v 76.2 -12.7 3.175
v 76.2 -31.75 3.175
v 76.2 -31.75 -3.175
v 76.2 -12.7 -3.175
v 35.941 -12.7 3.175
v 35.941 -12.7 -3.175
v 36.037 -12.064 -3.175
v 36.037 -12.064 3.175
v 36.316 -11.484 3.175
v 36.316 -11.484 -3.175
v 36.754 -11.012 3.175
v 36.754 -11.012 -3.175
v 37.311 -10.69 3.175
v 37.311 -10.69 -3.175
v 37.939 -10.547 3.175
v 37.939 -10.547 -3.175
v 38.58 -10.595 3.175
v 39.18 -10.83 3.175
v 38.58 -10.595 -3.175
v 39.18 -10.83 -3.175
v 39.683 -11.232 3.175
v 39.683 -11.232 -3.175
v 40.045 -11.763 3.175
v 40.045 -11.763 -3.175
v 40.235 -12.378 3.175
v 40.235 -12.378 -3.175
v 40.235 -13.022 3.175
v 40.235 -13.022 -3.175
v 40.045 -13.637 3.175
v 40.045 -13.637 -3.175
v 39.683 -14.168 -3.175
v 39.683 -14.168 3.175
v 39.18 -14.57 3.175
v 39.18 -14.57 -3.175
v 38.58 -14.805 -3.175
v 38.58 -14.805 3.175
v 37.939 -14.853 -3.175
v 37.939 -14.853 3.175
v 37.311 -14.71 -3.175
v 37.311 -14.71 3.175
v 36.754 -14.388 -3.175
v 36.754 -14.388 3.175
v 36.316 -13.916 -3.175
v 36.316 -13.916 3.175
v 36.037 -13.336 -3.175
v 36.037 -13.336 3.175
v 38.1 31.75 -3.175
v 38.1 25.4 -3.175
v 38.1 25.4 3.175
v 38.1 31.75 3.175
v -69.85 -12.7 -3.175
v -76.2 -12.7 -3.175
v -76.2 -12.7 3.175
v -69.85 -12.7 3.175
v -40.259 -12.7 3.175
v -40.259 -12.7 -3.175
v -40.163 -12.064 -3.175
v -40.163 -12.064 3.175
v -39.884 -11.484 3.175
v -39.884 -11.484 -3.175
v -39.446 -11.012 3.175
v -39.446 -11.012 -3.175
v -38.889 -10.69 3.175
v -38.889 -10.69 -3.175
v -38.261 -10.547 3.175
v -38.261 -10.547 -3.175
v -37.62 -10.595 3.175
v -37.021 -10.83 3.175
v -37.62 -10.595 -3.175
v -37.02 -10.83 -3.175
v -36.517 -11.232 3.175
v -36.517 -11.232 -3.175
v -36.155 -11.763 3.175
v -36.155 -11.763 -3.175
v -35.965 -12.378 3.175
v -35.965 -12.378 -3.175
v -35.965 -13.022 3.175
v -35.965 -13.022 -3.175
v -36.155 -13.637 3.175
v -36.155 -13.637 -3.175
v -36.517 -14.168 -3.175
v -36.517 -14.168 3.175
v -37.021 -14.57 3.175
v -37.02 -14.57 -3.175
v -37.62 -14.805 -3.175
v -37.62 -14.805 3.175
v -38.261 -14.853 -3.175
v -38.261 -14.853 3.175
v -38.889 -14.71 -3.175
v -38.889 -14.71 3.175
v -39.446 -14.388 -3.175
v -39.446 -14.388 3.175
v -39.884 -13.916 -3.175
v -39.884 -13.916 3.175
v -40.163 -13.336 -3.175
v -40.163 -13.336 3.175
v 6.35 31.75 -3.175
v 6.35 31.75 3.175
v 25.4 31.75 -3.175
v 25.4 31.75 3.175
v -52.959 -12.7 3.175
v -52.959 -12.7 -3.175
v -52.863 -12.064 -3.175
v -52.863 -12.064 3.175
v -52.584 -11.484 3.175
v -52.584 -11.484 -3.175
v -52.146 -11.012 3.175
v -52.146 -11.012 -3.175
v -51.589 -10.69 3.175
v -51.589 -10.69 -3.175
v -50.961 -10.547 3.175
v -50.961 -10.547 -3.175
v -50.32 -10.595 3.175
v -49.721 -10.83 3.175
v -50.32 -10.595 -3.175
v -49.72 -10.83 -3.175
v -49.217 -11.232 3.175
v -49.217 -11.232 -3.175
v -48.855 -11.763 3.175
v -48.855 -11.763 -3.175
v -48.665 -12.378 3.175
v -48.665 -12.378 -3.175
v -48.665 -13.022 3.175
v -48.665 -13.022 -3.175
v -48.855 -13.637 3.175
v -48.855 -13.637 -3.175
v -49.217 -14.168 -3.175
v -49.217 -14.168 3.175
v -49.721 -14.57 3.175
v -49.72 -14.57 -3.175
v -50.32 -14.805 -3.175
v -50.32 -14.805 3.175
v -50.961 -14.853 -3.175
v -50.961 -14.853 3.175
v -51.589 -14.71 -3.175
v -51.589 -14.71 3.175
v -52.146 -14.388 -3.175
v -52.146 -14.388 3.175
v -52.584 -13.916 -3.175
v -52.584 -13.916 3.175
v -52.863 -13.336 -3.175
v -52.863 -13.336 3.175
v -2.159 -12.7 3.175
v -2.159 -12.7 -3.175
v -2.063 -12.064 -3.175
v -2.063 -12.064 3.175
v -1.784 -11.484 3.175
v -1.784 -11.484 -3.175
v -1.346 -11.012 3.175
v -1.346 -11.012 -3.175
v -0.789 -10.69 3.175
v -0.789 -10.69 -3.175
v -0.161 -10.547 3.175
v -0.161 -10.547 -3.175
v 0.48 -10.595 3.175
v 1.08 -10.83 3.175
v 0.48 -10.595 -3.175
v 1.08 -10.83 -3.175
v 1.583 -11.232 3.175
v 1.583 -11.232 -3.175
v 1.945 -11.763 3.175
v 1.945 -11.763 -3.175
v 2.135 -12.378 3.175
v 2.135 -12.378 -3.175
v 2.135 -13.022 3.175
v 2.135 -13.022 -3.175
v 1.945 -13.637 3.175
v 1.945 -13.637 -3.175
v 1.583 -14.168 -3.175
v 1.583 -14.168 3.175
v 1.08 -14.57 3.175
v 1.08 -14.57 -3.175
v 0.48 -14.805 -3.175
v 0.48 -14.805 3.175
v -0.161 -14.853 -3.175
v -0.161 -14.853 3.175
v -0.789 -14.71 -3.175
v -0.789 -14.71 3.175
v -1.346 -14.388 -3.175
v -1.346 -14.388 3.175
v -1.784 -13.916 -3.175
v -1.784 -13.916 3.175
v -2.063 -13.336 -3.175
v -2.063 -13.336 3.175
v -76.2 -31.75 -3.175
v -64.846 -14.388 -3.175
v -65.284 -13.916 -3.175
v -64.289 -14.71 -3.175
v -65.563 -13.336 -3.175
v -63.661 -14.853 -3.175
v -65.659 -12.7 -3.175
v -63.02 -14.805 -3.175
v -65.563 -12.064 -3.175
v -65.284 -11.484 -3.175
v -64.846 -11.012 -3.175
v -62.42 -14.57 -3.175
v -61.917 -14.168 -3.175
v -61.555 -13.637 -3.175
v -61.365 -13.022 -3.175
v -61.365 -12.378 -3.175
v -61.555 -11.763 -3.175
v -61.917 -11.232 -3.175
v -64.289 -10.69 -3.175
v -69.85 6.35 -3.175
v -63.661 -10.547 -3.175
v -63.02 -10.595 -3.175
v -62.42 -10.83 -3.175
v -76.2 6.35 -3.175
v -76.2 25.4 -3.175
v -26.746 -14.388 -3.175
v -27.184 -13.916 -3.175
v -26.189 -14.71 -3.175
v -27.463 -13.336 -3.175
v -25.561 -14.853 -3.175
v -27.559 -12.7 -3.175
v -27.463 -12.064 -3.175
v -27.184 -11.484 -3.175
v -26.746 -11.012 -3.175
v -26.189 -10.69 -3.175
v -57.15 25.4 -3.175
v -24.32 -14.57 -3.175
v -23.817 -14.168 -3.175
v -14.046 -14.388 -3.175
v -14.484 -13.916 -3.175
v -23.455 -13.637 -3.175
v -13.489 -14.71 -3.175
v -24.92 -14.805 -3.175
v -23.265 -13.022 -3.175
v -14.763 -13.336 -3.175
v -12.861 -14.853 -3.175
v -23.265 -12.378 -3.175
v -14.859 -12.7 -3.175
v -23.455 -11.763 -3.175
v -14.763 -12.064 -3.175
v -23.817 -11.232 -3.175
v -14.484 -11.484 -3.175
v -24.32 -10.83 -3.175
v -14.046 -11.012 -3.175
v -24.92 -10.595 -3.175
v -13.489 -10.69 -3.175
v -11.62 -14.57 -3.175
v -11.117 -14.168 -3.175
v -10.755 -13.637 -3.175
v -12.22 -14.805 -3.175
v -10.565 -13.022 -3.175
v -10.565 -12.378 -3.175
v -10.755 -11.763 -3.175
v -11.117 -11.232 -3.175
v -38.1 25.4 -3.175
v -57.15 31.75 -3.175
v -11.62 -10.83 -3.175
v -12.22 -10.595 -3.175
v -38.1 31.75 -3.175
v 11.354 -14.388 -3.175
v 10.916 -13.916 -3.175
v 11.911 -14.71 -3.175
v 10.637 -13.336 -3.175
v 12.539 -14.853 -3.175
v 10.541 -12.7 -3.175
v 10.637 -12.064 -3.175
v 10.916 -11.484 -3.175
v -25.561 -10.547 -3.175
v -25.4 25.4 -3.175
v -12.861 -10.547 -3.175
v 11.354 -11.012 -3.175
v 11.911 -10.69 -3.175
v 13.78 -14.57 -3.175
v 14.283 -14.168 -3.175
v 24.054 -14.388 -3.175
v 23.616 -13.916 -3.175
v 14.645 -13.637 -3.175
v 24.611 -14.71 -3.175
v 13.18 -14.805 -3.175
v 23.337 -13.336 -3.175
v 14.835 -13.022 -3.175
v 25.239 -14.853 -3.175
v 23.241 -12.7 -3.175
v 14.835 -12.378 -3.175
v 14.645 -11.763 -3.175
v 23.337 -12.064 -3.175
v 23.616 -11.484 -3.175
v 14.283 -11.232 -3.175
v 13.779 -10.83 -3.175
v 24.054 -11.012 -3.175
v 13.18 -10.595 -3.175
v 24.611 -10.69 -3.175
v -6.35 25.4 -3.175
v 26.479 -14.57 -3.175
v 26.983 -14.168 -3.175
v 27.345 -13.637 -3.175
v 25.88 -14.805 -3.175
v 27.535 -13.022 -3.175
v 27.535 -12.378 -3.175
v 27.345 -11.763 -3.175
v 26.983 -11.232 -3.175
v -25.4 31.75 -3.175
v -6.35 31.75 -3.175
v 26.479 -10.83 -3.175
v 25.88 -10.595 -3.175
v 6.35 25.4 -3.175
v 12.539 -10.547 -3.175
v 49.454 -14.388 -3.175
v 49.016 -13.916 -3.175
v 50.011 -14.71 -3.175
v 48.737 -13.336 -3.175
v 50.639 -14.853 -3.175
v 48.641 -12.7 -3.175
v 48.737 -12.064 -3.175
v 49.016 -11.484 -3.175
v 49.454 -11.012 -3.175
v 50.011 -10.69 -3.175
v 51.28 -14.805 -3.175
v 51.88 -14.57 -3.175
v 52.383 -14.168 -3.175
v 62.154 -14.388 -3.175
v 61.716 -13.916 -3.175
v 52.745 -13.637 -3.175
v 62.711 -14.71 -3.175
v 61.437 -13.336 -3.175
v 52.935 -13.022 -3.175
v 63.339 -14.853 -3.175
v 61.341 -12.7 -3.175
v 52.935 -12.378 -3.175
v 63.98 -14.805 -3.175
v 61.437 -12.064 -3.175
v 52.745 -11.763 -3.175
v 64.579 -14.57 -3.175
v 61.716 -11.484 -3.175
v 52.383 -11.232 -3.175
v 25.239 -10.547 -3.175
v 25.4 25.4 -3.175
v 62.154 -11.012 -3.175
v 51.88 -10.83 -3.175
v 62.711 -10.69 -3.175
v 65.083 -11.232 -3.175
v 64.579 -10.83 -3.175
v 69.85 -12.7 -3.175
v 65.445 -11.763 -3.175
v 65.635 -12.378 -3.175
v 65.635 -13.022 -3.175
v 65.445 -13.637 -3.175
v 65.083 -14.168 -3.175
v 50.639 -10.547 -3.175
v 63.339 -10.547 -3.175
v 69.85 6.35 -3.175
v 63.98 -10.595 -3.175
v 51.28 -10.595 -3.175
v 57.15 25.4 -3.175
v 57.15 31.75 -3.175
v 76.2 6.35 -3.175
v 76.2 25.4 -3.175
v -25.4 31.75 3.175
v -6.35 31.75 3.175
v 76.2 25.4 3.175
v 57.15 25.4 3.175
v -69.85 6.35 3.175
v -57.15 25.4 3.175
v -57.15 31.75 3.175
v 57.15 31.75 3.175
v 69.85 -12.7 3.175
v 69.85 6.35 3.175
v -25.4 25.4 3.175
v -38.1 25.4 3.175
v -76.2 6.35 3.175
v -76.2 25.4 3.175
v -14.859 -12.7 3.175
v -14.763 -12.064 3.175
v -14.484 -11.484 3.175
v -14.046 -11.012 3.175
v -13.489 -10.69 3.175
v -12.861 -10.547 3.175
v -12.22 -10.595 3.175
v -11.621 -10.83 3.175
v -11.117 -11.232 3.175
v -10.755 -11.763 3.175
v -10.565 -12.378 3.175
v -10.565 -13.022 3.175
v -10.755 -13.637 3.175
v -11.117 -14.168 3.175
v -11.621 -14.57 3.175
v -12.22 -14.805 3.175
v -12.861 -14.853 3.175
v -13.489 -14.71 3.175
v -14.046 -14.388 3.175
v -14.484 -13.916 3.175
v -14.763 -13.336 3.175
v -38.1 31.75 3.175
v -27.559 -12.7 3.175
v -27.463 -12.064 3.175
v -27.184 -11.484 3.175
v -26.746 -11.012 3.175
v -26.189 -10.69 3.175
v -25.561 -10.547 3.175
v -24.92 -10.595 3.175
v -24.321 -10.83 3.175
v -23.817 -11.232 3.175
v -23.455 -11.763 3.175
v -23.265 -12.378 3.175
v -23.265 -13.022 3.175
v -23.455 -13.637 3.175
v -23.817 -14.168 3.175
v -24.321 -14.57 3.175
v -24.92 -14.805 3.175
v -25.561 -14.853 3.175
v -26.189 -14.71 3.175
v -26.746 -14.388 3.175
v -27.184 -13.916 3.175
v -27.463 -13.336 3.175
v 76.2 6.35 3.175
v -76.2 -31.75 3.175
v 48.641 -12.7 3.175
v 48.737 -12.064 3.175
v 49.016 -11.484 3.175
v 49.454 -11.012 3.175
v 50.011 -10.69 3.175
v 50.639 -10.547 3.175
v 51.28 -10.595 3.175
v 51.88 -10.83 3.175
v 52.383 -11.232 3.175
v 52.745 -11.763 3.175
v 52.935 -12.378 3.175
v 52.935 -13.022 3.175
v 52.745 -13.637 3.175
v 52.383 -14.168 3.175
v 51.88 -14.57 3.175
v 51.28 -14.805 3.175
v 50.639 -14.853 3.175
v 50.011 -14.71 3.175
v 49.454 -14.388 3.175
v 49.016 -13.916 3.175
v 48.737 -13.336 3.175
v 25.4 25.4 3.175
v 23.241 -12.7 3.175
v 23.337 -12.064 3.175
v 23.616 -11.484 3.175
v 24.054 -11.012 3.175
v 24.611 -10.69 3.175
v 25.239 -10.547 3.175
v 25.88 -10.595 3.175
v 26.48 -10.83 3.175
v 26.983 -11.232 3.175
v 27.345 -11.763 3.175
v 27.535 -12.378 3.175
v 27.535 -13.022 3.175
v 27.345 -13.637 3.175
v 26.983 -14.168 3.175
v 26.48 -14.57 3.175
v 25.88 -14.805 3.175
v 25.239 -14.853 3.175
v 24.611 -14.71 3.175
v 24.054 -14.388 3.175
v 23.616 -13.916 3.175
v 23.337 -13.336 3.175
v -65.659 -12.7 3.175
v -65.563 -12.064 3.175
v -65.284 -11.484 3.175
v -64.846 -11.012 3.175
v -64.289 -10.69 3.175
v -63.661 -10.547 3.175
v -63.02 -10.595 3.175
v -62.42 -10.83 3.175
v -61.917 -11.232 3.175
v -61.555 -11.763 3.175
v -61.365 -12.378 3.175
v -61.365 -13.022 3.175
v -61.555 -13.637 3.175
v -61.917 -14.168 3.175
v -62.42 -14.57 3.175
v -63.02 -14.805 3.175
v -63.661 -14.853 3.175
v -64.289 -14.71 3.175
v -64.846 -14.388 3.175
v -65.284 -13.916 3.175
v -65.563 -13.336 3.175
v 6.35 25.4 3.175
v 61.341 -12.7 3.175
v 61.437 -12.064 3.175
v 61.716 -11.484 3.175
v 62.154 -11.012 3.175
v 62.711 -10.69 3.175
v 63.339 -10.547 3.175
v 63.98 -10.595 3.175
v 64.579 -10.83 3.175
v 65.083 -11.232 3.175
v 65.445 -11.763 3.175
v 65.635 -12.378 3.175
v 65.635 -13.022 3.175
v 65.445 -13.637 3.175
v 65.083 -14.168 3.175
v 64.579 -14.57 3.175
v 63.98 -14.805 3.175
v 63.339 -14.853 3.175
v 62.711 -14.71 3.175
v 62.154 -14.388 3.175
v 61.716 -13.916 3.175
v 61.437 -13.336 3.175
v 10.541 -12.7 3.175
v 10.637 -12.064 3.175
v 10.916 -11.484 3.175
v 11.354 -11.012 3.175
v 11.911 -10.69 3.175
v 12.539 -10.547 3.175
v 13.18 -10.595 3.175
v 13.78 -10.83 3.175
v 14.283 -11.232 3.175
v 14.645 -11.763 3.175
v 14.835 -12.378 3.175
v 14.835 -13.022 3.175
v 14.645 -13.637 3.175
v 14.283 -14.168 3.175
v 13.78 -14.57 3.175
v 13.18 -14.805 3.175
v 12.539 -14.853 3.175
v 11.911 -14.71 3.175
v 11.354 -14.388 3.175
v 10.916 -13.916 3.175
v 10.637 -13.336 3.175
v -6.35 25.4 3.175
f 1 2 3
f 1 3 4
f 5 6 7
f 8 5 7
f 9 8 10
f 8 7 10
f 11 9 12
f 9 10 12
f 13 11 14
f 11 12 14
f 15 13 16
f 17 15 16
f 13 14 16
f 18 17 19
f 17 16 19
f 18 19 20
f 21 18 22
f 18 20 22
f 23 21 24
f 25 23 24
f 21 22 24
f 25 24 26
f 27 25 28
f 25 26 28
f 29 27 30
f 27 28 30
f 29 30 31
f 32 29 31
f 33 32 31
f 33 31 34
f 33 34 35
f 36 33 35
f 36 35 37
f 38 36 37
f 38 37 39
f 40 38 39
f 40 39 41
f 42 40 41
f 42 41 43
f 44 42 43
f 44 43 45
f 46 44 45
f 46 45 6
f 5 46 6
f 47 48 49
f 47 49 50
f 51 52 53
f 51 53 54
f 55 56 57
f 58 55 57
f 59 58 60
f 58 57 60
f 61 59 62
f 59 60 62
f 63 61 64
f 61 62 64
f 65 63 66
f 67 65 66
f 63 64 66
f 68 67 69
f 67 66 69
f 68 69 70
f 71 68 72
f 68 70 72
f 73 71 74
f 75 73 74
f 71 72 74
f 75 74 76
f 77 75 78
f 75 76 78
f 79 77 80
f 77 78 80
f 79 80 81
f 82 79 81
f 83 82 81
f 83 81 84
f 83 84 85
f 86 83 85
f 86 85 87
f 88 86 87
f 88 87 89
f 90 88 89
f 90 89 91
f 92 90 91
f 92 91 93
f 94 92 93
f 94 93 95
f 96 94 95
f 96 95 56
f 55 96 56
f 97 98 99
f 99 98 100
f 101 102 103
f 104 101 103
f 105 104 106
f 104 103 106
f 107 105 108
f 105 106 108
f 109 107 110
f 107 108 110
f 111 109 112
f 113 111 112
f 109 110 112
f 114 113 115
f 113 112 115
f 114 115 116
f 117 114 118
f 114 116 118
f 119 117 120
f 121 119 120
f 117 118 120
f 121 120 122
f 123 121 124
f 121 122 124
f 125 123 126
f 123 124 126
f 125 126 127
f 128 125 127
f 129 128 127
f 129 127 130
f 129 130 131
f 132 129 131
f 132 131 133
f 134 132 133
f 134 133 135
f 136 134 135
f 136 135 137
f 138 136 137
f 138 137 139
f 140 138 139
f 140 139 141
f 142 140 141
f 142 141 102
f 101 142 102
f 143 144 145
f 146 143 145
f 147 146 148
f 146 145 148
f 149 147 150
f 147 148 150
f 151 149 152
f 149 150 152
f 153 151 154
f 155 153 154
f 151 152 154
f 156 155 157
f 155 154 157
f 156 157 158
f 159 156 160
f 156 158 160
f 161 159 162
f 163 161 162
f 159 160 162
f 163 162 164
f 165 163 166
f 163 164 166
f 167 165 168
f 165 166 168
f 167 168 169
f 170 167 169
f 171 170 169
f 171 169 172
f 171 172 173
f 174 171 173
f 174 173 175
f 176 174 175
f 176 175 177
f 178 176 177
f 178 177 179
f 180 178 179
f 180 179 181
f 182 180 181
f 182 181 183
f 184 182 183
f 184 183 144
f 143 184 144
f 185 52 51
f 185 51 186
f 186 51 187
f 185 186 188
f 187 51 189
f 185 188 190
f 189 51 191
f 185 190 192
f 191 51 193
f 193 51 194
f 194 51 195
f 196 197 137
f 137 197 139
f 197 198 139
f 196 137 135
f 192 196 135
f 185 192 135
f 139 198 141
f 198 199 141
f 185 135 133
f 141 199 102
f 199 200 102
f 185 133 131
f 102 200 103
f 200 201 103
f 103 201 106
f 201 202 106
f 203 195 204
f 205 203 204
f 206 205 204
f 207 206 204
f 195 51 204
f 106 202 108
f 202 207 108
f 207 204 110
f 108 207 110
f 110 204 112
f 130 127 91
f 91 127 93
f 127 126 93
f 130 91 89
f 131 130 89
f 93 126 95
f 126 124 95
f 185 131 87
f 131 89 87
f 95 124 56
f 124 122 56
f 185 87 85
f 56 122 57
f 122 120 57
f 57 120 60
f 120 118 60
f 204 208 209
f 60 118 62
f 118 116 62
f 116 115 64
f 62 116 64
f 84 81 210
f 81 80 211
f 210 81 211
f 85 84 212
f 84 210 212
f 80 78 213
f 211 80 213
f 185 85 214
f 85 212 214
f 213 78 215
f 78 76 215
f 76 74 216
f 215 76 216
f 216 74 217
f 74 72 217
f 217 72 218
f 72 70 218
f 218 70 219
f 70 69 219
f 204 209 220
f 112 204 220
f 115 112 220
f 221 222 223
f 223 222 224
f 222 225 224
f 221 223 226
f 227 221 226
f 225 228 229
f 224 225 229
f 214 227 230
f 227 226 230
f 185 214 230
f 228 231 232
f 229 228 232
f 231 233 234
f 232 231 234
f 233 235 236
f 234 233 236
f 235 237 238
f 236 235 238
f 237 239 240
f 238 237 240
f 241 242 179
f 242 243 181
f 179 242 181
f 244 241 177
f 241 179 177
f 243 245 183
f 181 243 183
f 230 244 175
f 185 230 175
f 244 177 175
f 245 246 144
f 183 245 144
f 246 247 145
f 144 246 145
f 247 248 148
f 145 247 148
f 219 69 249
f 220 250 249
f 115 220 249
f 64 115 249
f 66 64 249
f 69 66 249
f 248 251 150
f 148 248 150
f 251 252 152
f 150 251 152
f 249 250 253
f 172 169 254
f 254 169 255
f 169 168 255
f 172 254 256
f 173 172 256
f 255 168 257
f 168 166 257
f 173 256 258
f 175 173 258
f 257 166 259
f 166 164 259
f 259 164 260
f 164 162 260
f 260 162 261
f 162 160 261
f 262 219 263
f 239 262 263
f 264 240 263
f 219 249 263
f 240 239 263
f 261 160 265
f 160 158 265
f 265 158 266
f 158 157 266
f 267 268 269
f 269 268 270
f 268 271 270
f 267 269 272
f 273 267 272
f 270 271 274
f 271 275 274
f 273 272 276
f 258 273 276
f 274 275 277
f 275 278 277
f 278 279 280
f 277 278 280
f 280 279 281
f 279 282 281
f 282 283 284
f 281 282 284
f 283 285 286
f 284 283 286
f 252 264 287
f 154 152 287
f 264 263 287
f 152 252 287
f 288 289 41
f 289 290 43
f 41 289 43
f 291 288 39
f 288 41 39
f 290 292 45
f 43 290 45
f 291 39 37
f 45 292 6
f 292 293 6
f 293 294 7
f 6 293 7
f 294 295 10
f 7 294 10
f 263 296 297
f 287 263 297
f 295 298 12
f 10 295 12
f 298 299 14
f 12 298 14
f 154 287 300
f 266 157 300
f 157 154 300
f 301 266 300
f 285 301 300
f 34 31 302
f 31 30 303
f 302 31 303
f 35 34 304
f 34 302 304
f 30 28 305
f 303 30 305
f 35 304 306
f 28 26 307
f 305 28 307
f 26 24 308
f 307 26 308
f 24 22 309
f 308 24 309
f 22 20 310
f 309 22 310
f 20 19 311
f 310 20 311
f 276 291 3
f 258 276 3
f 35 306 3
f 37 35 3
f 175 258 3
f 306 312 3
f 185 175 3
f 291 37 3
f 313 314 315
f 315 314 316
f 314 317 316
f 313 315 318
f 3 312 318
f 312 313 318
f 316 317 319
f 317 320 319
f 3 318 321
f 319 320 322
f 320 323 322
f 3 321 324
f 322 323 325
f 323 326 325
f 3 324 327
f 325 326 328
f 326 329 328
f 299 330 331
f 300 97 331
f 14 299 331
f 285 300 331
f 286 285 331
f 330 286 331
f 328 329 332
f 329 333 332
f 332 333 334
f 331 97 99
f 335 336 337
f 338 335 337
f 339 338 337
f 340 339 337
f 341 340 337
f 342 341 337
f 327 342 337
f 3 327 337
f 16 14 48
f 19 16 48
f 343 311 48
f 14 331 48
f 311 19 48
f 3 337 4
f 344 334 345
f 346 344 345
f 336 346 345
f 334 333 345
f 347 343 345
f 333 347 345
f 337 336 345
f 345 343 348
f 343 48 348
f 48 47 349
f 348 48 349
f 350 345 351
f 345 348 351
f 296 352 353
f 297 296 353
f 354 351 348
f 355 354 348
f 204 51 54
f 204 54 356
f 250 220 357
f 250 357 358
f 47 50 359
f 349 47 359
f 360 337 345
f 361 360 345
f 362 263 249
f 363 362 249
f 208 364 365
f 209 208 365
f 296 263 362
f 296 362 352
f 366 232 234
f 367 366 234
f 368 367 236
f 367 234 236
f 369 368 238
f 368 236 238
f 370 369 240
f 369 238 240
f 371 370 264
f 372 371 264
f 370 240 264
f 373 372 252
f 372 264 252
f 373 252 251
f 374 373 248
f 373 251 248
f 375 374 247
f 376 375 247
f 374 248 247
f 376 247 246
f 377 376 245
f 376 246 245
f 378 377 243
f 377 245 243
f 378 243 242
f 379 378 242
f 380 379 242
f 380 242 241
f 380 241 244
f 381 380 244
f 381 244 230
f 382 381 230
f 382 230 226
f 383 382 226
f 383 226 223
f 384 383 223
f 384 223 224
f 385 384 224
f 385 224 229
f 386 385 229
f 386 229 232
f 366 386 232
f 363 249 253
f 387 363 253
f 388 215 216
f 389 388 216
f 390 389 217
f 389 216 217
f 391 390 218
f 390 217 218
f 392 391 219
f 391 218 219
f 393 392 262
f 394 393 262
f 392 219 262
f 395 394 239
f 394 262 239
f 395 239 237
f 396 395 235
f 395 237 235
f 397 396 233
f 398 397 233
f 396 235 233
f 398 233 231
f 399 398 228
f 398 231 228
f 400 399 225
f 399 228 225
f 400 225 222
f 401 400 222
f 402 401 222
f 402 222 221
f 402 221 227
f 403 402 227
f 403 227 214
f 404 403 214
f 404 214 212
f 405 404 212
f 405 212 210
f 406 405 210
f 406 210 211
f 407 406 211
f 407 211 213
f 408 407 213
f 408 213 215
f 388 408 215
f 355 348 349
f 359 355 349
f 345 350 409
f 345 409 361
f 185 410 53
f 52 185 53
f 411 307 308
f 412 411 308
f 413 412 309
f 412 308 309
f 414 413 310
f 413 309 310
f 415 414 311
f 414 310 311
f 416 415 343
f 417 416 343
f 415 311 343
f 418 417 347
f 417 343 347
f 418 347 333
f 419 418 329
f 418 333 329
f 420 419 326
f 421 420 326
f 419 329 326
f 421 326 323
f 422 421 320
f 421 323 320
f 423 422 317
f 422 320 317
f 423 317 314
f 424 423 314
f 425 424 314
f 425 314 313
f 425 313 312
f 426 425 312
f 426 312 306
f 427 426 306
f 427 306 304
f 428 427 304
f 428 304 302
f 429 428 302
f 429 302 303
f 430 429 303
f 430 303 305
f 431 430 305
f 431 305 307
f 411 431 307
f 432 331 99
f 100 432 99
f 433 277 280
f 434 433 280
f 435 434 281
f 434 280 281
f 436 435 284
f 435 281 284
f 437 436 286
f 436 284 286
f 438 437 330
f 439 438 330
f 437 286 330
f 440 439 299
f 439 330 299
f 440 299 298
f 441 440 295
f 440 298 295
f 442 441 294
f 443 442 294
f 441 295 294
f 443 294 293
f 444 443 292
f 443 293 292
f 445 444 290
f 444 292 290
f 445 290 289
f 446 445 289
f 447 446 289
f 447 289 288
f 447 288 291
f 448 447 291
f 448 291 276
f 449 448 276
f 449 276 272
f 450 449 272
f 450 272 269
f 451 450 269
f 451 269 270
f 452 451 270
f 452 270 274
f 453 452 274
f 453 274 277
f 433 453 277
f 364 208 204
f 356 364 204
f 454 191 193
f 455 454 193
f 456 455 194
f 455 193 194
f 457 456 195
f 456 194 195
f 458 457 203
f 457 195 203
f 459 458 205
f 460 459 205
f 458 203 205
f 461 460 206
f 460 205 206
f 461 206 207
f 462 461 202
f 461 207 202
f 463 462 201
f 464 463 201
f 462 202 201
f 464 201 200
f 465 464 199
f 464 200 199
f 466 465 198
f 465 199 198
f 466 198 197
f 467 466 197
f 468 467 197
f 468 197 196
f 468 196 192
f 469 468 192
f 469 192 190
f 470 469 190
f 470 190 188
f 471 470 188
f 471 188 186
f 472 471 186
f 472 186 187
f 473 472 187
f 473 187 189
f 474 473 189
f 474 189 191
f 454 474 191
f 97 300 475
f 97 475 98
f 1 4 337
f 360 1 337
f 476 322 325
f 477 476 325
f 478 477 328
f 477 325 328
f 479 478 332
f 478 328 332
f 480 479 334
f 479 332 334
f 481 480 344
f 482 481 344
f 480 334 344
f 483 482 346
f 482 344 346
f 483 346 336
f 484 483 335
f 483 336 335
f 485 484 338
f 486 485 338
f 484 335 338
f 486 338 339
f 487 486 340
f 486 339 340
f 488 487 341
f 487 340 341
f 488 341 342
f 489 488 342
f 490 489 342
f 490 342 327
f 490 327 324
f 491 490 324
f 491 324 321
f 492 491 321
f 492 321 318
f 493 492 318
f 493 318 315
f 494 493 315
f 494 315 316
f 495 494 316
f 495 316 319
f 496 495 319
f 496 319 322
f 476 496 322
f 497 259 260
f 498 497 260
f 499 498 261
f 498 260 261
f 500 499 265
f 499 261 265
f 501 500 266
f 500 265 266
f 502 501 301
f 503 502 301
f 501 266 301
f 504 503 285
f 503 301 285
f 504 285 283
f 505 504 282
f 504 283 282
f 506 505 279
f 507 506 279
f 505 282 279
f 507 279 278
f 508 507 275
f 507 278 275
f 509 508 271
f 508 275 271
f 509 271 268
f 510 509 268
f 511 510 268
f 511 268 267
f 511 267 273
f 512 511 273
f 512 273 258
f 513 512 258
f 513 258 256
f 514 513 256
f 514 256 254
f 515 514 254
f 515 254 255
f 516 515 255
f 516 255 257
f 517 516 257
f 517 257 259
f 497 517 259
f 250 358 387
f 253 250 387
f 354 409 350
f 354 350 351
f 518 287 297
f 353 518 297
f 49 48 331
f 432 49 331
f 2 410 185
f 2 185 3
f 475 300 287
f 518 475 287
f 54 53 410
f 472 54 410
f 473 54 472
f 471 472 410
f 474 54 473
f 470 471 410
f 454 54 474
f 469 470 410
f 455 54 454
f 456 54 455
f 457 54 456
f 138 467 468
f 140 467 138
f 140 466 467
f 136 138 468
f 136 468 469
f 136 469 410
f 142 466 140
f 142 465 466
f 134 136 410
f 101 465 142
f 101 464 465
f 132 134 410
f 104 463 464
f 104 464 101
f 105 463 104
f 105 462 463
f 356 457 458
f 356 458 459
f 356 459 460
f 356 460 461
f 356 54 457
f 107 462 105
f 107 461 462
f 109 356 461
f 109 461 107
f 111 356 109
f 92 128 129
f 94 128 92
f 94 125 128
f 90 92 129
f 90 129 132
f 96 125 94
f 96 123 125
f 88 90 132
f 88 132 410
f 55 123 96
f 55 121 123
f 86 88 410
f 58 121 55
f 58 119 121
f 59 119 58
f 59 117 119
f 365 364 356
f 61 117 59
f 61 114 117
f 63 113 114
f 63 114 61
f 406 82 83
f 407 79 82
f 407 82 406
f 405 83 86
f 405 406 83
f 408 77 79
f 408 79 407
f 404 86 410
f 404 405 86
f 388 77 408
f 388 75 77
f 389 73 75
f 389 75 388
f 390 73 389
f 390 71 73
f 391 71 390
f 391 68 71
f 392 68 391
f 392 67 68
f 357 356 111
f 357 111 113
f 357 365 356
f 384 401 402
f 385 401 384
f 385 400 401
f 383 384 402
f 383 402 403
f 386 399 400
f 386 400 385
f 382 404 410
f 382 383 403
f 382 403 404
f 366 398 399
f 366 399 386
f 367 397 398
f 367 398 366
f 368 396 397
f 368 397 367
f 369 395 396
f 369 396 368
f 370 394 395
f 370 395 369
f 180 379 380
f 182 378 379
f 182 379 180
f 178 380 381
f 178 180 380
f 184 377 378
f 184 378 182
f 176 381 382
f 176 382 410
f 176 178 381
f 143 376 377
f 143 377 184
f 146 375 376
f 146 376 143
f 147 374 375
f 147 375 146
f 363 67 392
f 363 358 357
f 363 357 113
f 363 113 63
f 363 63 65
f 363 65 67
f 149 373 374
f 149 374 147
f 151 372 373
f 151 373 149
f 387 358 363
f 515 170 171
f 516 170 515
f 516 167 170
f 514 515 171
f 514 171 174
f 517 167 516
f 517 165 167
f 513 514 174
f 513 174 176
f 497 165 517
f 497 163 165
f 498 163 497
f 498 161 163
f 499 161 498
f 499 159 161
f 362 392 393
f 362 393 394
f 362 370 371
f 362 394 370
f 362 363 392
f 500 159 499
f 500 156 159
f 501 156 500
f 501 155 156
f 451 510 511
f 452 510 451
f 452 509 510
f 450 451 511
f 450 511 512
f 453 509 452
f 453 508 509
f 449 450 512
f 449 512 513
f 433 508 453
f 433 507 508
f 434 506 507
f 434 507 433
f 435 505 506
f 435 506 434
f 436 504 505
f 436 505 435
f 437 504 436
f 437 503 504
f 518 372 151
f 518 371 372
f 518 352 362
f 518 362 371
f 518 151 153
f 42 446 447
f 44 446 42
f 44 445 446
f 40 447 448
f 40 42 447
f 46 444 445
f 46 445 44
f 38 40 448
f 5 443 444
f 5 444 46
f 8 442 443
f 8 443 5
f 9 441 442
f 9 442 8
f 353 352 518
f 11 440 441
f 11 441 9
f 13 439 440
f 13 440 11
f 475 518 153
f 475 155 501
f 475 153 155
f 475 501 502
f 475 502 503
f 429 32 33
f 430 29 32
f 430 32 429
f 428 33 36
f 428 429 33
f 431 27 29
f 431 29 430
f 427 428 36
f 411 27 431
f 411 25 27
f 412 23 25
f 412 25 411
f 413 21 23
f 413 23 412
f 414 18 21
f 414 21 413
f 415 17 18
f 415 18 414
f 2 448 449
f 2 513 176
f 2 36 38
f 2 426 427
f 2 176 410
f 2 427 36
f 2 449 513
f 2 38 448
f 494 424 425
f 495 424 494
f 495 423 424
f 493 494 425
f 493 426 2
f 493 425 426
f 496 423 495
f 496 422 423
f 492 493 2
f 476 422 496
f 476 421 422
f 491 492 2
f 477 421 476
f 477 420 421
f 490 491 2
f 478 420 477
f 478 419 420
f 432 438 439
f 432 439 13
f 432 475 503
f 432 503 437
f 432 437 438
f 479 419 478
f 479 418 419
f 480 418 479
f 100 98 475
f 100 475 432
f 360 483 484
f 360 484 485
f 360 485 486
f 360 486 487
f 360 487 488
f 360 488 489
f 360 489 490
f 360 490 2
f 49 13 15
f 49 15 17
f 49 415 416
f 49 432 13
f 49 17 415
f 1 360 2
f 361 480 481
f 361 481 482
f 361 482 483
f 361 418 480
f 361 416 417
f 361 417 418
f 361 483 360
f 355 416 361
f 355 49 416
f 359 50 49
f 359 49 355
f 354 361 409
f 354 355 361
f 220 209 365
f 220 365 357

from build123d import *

# Parameters (mm, degrees)
SKETCH1_W            = 152.4
SKETCH1_H            = 63.5
BOSS_EXTRUDE1_DEPTH  = 3.175
SKETCH2_R            = 2.159
CUT_EXTRUDE1_DEPTH   = 83.793870546
LPATTERN1_COUNT      = 11
LPATTERN1_PITCH      = 12.7
LPATTERN1_COUNT_DIR2 = 11
LPATTERN1_PITCH_DIR2 = 12.7
SKETCH3_W            = 19.05
SKETCH3_H            = 6.35
CUT_EXTRUDE2_DEPTH   = 83.793870546
SKETCH4_W            = 12.7
SKETCH4_H            = 6.35
CUT_EXTRUDE3_DEPTH   = 83.793870546
LPATTERN2_COUNT      = 3
LPATTERN2_PITCH      = 31.75
SKETCH5_W            = 6.35
SKETCH5_H            = 19.05
CUT_EXTRUDE4_DEPTH   = 83.793870546


with BuildPart() as part:
    # Sketch1 → Boss-Extrude1 (new, symmetric)
    with BuildSketch(Plane.XY):
        Rectangle(SKETCH1_W, SKETCH1_H)
    extrude(amount=BOSS_EXTRUDE1_DEPTH, both=True)

    # Sketch2 → Cut-Extrude1 (cut, through all)
    with BuildSketch(Plane(origin=(0, 0, -3.175), x_dir=(-1, 0, 0), z_dir=(0, 0, -1))):
        with Locations((0, -12.7)):
            Circle(SKETCH2_R)
    cut_extrude1 = extrude(amount=-CUT_EXTRUDE1_DEPTH, mode=Mode.SUBTRACT)

    # LPattern1: Cut-Extrude1 11 × 11, 10 skipped
    with Locations(*[Vector(-1, 0, 0) * (i * LPATTERN1_PITCH) + Vector(1, 0, 0) * (j * LPATTERN1_PITCH_DIR2) for i in range(LPATTERN1_COUNT) for j in range(LPATTERN1_COUNT_DIR2) if (i, j) not in ((0, 0), (0, 6), (1, 7), (2, 8), (3, 9), (4, 10), (6, 0), (7, 1), (8, 2), (9, 3), (10, 4))]):
        add(cut_extrude1, mode=Mode.SUBTRACT)

    # Sketch3 → Cut-Extrude2 (cut, through all)
    with BuildSketch(Plane(origin=(0, 0, -3.175), x_dir=(-1, 0, 0), z_dir=(0, 0, -1))):
        with Locations((-66.675, 28.575)):
            Rectangle(SKETCH3_W, SKETCH3_H)
    cut_extrude2 = extrude(amount=-CUT_EXTRUDE2_DEPTH, mode=Mode.SUBTRACT)

    # Mirror1: Cut-Extrude2 across plane
    add(cut_extrude2.mirror(Plane(origin=(0, 0, 0), x_dir=(0, 0, 1), z_dir=(1, 0, 0))), mode=Mode.SUBTRACT)

    # Sketch4 → Cut-Extrude3 (cut, through all)
    with BuildSketch(Plane(origin=(0, 0, -3.175), x_dir=(-1, 0, 0), z_dir=(0, 0, -1))):
        with Locations((-31.75, 28.575)):
            Rectangle(SKETCH4_W, SKETCH4_H)
    cut_extrude3 = extrude(amount=-CUT_EXTRUDE3_DEPTH, mode=Mode.SUBTRACT)

    # LPattern2: Cut-Extrude3 ×3
    with Locations(*[(-i * LPATTERN2_PITCH, 0, 0) for i in range(1, LPATTERN2_COUNT)]):
        add(cut_extrude3, mode=Mode.SUBTRACT)

    # Sketch5 → Cut-Extrude4 (cut, through all)
    with BuildSketch(Plane(origin=(0, 0, -3.175), x_dir=(-1, 0, 0), z_dir=(0, 0, -1))):
        with Locations((-73.025, -3.175)):
            Rectangle(SKETCH5_W, SKETCH5_H)
    cut_extrude4 = extrude(amount=-CUT_EXTRUDE4_DEPTH, mode=Mode.SUBTRACT)

    # Mirror2: Cut-Extrude4 across plane
    add(cut_extrude4.mirror(Plane(origin=(0, 0, 0), x_dir=(0, 0, 1), z_dir=(1, 0, 0))), mode=Mode.SUBTRACT)


solid = part.part
